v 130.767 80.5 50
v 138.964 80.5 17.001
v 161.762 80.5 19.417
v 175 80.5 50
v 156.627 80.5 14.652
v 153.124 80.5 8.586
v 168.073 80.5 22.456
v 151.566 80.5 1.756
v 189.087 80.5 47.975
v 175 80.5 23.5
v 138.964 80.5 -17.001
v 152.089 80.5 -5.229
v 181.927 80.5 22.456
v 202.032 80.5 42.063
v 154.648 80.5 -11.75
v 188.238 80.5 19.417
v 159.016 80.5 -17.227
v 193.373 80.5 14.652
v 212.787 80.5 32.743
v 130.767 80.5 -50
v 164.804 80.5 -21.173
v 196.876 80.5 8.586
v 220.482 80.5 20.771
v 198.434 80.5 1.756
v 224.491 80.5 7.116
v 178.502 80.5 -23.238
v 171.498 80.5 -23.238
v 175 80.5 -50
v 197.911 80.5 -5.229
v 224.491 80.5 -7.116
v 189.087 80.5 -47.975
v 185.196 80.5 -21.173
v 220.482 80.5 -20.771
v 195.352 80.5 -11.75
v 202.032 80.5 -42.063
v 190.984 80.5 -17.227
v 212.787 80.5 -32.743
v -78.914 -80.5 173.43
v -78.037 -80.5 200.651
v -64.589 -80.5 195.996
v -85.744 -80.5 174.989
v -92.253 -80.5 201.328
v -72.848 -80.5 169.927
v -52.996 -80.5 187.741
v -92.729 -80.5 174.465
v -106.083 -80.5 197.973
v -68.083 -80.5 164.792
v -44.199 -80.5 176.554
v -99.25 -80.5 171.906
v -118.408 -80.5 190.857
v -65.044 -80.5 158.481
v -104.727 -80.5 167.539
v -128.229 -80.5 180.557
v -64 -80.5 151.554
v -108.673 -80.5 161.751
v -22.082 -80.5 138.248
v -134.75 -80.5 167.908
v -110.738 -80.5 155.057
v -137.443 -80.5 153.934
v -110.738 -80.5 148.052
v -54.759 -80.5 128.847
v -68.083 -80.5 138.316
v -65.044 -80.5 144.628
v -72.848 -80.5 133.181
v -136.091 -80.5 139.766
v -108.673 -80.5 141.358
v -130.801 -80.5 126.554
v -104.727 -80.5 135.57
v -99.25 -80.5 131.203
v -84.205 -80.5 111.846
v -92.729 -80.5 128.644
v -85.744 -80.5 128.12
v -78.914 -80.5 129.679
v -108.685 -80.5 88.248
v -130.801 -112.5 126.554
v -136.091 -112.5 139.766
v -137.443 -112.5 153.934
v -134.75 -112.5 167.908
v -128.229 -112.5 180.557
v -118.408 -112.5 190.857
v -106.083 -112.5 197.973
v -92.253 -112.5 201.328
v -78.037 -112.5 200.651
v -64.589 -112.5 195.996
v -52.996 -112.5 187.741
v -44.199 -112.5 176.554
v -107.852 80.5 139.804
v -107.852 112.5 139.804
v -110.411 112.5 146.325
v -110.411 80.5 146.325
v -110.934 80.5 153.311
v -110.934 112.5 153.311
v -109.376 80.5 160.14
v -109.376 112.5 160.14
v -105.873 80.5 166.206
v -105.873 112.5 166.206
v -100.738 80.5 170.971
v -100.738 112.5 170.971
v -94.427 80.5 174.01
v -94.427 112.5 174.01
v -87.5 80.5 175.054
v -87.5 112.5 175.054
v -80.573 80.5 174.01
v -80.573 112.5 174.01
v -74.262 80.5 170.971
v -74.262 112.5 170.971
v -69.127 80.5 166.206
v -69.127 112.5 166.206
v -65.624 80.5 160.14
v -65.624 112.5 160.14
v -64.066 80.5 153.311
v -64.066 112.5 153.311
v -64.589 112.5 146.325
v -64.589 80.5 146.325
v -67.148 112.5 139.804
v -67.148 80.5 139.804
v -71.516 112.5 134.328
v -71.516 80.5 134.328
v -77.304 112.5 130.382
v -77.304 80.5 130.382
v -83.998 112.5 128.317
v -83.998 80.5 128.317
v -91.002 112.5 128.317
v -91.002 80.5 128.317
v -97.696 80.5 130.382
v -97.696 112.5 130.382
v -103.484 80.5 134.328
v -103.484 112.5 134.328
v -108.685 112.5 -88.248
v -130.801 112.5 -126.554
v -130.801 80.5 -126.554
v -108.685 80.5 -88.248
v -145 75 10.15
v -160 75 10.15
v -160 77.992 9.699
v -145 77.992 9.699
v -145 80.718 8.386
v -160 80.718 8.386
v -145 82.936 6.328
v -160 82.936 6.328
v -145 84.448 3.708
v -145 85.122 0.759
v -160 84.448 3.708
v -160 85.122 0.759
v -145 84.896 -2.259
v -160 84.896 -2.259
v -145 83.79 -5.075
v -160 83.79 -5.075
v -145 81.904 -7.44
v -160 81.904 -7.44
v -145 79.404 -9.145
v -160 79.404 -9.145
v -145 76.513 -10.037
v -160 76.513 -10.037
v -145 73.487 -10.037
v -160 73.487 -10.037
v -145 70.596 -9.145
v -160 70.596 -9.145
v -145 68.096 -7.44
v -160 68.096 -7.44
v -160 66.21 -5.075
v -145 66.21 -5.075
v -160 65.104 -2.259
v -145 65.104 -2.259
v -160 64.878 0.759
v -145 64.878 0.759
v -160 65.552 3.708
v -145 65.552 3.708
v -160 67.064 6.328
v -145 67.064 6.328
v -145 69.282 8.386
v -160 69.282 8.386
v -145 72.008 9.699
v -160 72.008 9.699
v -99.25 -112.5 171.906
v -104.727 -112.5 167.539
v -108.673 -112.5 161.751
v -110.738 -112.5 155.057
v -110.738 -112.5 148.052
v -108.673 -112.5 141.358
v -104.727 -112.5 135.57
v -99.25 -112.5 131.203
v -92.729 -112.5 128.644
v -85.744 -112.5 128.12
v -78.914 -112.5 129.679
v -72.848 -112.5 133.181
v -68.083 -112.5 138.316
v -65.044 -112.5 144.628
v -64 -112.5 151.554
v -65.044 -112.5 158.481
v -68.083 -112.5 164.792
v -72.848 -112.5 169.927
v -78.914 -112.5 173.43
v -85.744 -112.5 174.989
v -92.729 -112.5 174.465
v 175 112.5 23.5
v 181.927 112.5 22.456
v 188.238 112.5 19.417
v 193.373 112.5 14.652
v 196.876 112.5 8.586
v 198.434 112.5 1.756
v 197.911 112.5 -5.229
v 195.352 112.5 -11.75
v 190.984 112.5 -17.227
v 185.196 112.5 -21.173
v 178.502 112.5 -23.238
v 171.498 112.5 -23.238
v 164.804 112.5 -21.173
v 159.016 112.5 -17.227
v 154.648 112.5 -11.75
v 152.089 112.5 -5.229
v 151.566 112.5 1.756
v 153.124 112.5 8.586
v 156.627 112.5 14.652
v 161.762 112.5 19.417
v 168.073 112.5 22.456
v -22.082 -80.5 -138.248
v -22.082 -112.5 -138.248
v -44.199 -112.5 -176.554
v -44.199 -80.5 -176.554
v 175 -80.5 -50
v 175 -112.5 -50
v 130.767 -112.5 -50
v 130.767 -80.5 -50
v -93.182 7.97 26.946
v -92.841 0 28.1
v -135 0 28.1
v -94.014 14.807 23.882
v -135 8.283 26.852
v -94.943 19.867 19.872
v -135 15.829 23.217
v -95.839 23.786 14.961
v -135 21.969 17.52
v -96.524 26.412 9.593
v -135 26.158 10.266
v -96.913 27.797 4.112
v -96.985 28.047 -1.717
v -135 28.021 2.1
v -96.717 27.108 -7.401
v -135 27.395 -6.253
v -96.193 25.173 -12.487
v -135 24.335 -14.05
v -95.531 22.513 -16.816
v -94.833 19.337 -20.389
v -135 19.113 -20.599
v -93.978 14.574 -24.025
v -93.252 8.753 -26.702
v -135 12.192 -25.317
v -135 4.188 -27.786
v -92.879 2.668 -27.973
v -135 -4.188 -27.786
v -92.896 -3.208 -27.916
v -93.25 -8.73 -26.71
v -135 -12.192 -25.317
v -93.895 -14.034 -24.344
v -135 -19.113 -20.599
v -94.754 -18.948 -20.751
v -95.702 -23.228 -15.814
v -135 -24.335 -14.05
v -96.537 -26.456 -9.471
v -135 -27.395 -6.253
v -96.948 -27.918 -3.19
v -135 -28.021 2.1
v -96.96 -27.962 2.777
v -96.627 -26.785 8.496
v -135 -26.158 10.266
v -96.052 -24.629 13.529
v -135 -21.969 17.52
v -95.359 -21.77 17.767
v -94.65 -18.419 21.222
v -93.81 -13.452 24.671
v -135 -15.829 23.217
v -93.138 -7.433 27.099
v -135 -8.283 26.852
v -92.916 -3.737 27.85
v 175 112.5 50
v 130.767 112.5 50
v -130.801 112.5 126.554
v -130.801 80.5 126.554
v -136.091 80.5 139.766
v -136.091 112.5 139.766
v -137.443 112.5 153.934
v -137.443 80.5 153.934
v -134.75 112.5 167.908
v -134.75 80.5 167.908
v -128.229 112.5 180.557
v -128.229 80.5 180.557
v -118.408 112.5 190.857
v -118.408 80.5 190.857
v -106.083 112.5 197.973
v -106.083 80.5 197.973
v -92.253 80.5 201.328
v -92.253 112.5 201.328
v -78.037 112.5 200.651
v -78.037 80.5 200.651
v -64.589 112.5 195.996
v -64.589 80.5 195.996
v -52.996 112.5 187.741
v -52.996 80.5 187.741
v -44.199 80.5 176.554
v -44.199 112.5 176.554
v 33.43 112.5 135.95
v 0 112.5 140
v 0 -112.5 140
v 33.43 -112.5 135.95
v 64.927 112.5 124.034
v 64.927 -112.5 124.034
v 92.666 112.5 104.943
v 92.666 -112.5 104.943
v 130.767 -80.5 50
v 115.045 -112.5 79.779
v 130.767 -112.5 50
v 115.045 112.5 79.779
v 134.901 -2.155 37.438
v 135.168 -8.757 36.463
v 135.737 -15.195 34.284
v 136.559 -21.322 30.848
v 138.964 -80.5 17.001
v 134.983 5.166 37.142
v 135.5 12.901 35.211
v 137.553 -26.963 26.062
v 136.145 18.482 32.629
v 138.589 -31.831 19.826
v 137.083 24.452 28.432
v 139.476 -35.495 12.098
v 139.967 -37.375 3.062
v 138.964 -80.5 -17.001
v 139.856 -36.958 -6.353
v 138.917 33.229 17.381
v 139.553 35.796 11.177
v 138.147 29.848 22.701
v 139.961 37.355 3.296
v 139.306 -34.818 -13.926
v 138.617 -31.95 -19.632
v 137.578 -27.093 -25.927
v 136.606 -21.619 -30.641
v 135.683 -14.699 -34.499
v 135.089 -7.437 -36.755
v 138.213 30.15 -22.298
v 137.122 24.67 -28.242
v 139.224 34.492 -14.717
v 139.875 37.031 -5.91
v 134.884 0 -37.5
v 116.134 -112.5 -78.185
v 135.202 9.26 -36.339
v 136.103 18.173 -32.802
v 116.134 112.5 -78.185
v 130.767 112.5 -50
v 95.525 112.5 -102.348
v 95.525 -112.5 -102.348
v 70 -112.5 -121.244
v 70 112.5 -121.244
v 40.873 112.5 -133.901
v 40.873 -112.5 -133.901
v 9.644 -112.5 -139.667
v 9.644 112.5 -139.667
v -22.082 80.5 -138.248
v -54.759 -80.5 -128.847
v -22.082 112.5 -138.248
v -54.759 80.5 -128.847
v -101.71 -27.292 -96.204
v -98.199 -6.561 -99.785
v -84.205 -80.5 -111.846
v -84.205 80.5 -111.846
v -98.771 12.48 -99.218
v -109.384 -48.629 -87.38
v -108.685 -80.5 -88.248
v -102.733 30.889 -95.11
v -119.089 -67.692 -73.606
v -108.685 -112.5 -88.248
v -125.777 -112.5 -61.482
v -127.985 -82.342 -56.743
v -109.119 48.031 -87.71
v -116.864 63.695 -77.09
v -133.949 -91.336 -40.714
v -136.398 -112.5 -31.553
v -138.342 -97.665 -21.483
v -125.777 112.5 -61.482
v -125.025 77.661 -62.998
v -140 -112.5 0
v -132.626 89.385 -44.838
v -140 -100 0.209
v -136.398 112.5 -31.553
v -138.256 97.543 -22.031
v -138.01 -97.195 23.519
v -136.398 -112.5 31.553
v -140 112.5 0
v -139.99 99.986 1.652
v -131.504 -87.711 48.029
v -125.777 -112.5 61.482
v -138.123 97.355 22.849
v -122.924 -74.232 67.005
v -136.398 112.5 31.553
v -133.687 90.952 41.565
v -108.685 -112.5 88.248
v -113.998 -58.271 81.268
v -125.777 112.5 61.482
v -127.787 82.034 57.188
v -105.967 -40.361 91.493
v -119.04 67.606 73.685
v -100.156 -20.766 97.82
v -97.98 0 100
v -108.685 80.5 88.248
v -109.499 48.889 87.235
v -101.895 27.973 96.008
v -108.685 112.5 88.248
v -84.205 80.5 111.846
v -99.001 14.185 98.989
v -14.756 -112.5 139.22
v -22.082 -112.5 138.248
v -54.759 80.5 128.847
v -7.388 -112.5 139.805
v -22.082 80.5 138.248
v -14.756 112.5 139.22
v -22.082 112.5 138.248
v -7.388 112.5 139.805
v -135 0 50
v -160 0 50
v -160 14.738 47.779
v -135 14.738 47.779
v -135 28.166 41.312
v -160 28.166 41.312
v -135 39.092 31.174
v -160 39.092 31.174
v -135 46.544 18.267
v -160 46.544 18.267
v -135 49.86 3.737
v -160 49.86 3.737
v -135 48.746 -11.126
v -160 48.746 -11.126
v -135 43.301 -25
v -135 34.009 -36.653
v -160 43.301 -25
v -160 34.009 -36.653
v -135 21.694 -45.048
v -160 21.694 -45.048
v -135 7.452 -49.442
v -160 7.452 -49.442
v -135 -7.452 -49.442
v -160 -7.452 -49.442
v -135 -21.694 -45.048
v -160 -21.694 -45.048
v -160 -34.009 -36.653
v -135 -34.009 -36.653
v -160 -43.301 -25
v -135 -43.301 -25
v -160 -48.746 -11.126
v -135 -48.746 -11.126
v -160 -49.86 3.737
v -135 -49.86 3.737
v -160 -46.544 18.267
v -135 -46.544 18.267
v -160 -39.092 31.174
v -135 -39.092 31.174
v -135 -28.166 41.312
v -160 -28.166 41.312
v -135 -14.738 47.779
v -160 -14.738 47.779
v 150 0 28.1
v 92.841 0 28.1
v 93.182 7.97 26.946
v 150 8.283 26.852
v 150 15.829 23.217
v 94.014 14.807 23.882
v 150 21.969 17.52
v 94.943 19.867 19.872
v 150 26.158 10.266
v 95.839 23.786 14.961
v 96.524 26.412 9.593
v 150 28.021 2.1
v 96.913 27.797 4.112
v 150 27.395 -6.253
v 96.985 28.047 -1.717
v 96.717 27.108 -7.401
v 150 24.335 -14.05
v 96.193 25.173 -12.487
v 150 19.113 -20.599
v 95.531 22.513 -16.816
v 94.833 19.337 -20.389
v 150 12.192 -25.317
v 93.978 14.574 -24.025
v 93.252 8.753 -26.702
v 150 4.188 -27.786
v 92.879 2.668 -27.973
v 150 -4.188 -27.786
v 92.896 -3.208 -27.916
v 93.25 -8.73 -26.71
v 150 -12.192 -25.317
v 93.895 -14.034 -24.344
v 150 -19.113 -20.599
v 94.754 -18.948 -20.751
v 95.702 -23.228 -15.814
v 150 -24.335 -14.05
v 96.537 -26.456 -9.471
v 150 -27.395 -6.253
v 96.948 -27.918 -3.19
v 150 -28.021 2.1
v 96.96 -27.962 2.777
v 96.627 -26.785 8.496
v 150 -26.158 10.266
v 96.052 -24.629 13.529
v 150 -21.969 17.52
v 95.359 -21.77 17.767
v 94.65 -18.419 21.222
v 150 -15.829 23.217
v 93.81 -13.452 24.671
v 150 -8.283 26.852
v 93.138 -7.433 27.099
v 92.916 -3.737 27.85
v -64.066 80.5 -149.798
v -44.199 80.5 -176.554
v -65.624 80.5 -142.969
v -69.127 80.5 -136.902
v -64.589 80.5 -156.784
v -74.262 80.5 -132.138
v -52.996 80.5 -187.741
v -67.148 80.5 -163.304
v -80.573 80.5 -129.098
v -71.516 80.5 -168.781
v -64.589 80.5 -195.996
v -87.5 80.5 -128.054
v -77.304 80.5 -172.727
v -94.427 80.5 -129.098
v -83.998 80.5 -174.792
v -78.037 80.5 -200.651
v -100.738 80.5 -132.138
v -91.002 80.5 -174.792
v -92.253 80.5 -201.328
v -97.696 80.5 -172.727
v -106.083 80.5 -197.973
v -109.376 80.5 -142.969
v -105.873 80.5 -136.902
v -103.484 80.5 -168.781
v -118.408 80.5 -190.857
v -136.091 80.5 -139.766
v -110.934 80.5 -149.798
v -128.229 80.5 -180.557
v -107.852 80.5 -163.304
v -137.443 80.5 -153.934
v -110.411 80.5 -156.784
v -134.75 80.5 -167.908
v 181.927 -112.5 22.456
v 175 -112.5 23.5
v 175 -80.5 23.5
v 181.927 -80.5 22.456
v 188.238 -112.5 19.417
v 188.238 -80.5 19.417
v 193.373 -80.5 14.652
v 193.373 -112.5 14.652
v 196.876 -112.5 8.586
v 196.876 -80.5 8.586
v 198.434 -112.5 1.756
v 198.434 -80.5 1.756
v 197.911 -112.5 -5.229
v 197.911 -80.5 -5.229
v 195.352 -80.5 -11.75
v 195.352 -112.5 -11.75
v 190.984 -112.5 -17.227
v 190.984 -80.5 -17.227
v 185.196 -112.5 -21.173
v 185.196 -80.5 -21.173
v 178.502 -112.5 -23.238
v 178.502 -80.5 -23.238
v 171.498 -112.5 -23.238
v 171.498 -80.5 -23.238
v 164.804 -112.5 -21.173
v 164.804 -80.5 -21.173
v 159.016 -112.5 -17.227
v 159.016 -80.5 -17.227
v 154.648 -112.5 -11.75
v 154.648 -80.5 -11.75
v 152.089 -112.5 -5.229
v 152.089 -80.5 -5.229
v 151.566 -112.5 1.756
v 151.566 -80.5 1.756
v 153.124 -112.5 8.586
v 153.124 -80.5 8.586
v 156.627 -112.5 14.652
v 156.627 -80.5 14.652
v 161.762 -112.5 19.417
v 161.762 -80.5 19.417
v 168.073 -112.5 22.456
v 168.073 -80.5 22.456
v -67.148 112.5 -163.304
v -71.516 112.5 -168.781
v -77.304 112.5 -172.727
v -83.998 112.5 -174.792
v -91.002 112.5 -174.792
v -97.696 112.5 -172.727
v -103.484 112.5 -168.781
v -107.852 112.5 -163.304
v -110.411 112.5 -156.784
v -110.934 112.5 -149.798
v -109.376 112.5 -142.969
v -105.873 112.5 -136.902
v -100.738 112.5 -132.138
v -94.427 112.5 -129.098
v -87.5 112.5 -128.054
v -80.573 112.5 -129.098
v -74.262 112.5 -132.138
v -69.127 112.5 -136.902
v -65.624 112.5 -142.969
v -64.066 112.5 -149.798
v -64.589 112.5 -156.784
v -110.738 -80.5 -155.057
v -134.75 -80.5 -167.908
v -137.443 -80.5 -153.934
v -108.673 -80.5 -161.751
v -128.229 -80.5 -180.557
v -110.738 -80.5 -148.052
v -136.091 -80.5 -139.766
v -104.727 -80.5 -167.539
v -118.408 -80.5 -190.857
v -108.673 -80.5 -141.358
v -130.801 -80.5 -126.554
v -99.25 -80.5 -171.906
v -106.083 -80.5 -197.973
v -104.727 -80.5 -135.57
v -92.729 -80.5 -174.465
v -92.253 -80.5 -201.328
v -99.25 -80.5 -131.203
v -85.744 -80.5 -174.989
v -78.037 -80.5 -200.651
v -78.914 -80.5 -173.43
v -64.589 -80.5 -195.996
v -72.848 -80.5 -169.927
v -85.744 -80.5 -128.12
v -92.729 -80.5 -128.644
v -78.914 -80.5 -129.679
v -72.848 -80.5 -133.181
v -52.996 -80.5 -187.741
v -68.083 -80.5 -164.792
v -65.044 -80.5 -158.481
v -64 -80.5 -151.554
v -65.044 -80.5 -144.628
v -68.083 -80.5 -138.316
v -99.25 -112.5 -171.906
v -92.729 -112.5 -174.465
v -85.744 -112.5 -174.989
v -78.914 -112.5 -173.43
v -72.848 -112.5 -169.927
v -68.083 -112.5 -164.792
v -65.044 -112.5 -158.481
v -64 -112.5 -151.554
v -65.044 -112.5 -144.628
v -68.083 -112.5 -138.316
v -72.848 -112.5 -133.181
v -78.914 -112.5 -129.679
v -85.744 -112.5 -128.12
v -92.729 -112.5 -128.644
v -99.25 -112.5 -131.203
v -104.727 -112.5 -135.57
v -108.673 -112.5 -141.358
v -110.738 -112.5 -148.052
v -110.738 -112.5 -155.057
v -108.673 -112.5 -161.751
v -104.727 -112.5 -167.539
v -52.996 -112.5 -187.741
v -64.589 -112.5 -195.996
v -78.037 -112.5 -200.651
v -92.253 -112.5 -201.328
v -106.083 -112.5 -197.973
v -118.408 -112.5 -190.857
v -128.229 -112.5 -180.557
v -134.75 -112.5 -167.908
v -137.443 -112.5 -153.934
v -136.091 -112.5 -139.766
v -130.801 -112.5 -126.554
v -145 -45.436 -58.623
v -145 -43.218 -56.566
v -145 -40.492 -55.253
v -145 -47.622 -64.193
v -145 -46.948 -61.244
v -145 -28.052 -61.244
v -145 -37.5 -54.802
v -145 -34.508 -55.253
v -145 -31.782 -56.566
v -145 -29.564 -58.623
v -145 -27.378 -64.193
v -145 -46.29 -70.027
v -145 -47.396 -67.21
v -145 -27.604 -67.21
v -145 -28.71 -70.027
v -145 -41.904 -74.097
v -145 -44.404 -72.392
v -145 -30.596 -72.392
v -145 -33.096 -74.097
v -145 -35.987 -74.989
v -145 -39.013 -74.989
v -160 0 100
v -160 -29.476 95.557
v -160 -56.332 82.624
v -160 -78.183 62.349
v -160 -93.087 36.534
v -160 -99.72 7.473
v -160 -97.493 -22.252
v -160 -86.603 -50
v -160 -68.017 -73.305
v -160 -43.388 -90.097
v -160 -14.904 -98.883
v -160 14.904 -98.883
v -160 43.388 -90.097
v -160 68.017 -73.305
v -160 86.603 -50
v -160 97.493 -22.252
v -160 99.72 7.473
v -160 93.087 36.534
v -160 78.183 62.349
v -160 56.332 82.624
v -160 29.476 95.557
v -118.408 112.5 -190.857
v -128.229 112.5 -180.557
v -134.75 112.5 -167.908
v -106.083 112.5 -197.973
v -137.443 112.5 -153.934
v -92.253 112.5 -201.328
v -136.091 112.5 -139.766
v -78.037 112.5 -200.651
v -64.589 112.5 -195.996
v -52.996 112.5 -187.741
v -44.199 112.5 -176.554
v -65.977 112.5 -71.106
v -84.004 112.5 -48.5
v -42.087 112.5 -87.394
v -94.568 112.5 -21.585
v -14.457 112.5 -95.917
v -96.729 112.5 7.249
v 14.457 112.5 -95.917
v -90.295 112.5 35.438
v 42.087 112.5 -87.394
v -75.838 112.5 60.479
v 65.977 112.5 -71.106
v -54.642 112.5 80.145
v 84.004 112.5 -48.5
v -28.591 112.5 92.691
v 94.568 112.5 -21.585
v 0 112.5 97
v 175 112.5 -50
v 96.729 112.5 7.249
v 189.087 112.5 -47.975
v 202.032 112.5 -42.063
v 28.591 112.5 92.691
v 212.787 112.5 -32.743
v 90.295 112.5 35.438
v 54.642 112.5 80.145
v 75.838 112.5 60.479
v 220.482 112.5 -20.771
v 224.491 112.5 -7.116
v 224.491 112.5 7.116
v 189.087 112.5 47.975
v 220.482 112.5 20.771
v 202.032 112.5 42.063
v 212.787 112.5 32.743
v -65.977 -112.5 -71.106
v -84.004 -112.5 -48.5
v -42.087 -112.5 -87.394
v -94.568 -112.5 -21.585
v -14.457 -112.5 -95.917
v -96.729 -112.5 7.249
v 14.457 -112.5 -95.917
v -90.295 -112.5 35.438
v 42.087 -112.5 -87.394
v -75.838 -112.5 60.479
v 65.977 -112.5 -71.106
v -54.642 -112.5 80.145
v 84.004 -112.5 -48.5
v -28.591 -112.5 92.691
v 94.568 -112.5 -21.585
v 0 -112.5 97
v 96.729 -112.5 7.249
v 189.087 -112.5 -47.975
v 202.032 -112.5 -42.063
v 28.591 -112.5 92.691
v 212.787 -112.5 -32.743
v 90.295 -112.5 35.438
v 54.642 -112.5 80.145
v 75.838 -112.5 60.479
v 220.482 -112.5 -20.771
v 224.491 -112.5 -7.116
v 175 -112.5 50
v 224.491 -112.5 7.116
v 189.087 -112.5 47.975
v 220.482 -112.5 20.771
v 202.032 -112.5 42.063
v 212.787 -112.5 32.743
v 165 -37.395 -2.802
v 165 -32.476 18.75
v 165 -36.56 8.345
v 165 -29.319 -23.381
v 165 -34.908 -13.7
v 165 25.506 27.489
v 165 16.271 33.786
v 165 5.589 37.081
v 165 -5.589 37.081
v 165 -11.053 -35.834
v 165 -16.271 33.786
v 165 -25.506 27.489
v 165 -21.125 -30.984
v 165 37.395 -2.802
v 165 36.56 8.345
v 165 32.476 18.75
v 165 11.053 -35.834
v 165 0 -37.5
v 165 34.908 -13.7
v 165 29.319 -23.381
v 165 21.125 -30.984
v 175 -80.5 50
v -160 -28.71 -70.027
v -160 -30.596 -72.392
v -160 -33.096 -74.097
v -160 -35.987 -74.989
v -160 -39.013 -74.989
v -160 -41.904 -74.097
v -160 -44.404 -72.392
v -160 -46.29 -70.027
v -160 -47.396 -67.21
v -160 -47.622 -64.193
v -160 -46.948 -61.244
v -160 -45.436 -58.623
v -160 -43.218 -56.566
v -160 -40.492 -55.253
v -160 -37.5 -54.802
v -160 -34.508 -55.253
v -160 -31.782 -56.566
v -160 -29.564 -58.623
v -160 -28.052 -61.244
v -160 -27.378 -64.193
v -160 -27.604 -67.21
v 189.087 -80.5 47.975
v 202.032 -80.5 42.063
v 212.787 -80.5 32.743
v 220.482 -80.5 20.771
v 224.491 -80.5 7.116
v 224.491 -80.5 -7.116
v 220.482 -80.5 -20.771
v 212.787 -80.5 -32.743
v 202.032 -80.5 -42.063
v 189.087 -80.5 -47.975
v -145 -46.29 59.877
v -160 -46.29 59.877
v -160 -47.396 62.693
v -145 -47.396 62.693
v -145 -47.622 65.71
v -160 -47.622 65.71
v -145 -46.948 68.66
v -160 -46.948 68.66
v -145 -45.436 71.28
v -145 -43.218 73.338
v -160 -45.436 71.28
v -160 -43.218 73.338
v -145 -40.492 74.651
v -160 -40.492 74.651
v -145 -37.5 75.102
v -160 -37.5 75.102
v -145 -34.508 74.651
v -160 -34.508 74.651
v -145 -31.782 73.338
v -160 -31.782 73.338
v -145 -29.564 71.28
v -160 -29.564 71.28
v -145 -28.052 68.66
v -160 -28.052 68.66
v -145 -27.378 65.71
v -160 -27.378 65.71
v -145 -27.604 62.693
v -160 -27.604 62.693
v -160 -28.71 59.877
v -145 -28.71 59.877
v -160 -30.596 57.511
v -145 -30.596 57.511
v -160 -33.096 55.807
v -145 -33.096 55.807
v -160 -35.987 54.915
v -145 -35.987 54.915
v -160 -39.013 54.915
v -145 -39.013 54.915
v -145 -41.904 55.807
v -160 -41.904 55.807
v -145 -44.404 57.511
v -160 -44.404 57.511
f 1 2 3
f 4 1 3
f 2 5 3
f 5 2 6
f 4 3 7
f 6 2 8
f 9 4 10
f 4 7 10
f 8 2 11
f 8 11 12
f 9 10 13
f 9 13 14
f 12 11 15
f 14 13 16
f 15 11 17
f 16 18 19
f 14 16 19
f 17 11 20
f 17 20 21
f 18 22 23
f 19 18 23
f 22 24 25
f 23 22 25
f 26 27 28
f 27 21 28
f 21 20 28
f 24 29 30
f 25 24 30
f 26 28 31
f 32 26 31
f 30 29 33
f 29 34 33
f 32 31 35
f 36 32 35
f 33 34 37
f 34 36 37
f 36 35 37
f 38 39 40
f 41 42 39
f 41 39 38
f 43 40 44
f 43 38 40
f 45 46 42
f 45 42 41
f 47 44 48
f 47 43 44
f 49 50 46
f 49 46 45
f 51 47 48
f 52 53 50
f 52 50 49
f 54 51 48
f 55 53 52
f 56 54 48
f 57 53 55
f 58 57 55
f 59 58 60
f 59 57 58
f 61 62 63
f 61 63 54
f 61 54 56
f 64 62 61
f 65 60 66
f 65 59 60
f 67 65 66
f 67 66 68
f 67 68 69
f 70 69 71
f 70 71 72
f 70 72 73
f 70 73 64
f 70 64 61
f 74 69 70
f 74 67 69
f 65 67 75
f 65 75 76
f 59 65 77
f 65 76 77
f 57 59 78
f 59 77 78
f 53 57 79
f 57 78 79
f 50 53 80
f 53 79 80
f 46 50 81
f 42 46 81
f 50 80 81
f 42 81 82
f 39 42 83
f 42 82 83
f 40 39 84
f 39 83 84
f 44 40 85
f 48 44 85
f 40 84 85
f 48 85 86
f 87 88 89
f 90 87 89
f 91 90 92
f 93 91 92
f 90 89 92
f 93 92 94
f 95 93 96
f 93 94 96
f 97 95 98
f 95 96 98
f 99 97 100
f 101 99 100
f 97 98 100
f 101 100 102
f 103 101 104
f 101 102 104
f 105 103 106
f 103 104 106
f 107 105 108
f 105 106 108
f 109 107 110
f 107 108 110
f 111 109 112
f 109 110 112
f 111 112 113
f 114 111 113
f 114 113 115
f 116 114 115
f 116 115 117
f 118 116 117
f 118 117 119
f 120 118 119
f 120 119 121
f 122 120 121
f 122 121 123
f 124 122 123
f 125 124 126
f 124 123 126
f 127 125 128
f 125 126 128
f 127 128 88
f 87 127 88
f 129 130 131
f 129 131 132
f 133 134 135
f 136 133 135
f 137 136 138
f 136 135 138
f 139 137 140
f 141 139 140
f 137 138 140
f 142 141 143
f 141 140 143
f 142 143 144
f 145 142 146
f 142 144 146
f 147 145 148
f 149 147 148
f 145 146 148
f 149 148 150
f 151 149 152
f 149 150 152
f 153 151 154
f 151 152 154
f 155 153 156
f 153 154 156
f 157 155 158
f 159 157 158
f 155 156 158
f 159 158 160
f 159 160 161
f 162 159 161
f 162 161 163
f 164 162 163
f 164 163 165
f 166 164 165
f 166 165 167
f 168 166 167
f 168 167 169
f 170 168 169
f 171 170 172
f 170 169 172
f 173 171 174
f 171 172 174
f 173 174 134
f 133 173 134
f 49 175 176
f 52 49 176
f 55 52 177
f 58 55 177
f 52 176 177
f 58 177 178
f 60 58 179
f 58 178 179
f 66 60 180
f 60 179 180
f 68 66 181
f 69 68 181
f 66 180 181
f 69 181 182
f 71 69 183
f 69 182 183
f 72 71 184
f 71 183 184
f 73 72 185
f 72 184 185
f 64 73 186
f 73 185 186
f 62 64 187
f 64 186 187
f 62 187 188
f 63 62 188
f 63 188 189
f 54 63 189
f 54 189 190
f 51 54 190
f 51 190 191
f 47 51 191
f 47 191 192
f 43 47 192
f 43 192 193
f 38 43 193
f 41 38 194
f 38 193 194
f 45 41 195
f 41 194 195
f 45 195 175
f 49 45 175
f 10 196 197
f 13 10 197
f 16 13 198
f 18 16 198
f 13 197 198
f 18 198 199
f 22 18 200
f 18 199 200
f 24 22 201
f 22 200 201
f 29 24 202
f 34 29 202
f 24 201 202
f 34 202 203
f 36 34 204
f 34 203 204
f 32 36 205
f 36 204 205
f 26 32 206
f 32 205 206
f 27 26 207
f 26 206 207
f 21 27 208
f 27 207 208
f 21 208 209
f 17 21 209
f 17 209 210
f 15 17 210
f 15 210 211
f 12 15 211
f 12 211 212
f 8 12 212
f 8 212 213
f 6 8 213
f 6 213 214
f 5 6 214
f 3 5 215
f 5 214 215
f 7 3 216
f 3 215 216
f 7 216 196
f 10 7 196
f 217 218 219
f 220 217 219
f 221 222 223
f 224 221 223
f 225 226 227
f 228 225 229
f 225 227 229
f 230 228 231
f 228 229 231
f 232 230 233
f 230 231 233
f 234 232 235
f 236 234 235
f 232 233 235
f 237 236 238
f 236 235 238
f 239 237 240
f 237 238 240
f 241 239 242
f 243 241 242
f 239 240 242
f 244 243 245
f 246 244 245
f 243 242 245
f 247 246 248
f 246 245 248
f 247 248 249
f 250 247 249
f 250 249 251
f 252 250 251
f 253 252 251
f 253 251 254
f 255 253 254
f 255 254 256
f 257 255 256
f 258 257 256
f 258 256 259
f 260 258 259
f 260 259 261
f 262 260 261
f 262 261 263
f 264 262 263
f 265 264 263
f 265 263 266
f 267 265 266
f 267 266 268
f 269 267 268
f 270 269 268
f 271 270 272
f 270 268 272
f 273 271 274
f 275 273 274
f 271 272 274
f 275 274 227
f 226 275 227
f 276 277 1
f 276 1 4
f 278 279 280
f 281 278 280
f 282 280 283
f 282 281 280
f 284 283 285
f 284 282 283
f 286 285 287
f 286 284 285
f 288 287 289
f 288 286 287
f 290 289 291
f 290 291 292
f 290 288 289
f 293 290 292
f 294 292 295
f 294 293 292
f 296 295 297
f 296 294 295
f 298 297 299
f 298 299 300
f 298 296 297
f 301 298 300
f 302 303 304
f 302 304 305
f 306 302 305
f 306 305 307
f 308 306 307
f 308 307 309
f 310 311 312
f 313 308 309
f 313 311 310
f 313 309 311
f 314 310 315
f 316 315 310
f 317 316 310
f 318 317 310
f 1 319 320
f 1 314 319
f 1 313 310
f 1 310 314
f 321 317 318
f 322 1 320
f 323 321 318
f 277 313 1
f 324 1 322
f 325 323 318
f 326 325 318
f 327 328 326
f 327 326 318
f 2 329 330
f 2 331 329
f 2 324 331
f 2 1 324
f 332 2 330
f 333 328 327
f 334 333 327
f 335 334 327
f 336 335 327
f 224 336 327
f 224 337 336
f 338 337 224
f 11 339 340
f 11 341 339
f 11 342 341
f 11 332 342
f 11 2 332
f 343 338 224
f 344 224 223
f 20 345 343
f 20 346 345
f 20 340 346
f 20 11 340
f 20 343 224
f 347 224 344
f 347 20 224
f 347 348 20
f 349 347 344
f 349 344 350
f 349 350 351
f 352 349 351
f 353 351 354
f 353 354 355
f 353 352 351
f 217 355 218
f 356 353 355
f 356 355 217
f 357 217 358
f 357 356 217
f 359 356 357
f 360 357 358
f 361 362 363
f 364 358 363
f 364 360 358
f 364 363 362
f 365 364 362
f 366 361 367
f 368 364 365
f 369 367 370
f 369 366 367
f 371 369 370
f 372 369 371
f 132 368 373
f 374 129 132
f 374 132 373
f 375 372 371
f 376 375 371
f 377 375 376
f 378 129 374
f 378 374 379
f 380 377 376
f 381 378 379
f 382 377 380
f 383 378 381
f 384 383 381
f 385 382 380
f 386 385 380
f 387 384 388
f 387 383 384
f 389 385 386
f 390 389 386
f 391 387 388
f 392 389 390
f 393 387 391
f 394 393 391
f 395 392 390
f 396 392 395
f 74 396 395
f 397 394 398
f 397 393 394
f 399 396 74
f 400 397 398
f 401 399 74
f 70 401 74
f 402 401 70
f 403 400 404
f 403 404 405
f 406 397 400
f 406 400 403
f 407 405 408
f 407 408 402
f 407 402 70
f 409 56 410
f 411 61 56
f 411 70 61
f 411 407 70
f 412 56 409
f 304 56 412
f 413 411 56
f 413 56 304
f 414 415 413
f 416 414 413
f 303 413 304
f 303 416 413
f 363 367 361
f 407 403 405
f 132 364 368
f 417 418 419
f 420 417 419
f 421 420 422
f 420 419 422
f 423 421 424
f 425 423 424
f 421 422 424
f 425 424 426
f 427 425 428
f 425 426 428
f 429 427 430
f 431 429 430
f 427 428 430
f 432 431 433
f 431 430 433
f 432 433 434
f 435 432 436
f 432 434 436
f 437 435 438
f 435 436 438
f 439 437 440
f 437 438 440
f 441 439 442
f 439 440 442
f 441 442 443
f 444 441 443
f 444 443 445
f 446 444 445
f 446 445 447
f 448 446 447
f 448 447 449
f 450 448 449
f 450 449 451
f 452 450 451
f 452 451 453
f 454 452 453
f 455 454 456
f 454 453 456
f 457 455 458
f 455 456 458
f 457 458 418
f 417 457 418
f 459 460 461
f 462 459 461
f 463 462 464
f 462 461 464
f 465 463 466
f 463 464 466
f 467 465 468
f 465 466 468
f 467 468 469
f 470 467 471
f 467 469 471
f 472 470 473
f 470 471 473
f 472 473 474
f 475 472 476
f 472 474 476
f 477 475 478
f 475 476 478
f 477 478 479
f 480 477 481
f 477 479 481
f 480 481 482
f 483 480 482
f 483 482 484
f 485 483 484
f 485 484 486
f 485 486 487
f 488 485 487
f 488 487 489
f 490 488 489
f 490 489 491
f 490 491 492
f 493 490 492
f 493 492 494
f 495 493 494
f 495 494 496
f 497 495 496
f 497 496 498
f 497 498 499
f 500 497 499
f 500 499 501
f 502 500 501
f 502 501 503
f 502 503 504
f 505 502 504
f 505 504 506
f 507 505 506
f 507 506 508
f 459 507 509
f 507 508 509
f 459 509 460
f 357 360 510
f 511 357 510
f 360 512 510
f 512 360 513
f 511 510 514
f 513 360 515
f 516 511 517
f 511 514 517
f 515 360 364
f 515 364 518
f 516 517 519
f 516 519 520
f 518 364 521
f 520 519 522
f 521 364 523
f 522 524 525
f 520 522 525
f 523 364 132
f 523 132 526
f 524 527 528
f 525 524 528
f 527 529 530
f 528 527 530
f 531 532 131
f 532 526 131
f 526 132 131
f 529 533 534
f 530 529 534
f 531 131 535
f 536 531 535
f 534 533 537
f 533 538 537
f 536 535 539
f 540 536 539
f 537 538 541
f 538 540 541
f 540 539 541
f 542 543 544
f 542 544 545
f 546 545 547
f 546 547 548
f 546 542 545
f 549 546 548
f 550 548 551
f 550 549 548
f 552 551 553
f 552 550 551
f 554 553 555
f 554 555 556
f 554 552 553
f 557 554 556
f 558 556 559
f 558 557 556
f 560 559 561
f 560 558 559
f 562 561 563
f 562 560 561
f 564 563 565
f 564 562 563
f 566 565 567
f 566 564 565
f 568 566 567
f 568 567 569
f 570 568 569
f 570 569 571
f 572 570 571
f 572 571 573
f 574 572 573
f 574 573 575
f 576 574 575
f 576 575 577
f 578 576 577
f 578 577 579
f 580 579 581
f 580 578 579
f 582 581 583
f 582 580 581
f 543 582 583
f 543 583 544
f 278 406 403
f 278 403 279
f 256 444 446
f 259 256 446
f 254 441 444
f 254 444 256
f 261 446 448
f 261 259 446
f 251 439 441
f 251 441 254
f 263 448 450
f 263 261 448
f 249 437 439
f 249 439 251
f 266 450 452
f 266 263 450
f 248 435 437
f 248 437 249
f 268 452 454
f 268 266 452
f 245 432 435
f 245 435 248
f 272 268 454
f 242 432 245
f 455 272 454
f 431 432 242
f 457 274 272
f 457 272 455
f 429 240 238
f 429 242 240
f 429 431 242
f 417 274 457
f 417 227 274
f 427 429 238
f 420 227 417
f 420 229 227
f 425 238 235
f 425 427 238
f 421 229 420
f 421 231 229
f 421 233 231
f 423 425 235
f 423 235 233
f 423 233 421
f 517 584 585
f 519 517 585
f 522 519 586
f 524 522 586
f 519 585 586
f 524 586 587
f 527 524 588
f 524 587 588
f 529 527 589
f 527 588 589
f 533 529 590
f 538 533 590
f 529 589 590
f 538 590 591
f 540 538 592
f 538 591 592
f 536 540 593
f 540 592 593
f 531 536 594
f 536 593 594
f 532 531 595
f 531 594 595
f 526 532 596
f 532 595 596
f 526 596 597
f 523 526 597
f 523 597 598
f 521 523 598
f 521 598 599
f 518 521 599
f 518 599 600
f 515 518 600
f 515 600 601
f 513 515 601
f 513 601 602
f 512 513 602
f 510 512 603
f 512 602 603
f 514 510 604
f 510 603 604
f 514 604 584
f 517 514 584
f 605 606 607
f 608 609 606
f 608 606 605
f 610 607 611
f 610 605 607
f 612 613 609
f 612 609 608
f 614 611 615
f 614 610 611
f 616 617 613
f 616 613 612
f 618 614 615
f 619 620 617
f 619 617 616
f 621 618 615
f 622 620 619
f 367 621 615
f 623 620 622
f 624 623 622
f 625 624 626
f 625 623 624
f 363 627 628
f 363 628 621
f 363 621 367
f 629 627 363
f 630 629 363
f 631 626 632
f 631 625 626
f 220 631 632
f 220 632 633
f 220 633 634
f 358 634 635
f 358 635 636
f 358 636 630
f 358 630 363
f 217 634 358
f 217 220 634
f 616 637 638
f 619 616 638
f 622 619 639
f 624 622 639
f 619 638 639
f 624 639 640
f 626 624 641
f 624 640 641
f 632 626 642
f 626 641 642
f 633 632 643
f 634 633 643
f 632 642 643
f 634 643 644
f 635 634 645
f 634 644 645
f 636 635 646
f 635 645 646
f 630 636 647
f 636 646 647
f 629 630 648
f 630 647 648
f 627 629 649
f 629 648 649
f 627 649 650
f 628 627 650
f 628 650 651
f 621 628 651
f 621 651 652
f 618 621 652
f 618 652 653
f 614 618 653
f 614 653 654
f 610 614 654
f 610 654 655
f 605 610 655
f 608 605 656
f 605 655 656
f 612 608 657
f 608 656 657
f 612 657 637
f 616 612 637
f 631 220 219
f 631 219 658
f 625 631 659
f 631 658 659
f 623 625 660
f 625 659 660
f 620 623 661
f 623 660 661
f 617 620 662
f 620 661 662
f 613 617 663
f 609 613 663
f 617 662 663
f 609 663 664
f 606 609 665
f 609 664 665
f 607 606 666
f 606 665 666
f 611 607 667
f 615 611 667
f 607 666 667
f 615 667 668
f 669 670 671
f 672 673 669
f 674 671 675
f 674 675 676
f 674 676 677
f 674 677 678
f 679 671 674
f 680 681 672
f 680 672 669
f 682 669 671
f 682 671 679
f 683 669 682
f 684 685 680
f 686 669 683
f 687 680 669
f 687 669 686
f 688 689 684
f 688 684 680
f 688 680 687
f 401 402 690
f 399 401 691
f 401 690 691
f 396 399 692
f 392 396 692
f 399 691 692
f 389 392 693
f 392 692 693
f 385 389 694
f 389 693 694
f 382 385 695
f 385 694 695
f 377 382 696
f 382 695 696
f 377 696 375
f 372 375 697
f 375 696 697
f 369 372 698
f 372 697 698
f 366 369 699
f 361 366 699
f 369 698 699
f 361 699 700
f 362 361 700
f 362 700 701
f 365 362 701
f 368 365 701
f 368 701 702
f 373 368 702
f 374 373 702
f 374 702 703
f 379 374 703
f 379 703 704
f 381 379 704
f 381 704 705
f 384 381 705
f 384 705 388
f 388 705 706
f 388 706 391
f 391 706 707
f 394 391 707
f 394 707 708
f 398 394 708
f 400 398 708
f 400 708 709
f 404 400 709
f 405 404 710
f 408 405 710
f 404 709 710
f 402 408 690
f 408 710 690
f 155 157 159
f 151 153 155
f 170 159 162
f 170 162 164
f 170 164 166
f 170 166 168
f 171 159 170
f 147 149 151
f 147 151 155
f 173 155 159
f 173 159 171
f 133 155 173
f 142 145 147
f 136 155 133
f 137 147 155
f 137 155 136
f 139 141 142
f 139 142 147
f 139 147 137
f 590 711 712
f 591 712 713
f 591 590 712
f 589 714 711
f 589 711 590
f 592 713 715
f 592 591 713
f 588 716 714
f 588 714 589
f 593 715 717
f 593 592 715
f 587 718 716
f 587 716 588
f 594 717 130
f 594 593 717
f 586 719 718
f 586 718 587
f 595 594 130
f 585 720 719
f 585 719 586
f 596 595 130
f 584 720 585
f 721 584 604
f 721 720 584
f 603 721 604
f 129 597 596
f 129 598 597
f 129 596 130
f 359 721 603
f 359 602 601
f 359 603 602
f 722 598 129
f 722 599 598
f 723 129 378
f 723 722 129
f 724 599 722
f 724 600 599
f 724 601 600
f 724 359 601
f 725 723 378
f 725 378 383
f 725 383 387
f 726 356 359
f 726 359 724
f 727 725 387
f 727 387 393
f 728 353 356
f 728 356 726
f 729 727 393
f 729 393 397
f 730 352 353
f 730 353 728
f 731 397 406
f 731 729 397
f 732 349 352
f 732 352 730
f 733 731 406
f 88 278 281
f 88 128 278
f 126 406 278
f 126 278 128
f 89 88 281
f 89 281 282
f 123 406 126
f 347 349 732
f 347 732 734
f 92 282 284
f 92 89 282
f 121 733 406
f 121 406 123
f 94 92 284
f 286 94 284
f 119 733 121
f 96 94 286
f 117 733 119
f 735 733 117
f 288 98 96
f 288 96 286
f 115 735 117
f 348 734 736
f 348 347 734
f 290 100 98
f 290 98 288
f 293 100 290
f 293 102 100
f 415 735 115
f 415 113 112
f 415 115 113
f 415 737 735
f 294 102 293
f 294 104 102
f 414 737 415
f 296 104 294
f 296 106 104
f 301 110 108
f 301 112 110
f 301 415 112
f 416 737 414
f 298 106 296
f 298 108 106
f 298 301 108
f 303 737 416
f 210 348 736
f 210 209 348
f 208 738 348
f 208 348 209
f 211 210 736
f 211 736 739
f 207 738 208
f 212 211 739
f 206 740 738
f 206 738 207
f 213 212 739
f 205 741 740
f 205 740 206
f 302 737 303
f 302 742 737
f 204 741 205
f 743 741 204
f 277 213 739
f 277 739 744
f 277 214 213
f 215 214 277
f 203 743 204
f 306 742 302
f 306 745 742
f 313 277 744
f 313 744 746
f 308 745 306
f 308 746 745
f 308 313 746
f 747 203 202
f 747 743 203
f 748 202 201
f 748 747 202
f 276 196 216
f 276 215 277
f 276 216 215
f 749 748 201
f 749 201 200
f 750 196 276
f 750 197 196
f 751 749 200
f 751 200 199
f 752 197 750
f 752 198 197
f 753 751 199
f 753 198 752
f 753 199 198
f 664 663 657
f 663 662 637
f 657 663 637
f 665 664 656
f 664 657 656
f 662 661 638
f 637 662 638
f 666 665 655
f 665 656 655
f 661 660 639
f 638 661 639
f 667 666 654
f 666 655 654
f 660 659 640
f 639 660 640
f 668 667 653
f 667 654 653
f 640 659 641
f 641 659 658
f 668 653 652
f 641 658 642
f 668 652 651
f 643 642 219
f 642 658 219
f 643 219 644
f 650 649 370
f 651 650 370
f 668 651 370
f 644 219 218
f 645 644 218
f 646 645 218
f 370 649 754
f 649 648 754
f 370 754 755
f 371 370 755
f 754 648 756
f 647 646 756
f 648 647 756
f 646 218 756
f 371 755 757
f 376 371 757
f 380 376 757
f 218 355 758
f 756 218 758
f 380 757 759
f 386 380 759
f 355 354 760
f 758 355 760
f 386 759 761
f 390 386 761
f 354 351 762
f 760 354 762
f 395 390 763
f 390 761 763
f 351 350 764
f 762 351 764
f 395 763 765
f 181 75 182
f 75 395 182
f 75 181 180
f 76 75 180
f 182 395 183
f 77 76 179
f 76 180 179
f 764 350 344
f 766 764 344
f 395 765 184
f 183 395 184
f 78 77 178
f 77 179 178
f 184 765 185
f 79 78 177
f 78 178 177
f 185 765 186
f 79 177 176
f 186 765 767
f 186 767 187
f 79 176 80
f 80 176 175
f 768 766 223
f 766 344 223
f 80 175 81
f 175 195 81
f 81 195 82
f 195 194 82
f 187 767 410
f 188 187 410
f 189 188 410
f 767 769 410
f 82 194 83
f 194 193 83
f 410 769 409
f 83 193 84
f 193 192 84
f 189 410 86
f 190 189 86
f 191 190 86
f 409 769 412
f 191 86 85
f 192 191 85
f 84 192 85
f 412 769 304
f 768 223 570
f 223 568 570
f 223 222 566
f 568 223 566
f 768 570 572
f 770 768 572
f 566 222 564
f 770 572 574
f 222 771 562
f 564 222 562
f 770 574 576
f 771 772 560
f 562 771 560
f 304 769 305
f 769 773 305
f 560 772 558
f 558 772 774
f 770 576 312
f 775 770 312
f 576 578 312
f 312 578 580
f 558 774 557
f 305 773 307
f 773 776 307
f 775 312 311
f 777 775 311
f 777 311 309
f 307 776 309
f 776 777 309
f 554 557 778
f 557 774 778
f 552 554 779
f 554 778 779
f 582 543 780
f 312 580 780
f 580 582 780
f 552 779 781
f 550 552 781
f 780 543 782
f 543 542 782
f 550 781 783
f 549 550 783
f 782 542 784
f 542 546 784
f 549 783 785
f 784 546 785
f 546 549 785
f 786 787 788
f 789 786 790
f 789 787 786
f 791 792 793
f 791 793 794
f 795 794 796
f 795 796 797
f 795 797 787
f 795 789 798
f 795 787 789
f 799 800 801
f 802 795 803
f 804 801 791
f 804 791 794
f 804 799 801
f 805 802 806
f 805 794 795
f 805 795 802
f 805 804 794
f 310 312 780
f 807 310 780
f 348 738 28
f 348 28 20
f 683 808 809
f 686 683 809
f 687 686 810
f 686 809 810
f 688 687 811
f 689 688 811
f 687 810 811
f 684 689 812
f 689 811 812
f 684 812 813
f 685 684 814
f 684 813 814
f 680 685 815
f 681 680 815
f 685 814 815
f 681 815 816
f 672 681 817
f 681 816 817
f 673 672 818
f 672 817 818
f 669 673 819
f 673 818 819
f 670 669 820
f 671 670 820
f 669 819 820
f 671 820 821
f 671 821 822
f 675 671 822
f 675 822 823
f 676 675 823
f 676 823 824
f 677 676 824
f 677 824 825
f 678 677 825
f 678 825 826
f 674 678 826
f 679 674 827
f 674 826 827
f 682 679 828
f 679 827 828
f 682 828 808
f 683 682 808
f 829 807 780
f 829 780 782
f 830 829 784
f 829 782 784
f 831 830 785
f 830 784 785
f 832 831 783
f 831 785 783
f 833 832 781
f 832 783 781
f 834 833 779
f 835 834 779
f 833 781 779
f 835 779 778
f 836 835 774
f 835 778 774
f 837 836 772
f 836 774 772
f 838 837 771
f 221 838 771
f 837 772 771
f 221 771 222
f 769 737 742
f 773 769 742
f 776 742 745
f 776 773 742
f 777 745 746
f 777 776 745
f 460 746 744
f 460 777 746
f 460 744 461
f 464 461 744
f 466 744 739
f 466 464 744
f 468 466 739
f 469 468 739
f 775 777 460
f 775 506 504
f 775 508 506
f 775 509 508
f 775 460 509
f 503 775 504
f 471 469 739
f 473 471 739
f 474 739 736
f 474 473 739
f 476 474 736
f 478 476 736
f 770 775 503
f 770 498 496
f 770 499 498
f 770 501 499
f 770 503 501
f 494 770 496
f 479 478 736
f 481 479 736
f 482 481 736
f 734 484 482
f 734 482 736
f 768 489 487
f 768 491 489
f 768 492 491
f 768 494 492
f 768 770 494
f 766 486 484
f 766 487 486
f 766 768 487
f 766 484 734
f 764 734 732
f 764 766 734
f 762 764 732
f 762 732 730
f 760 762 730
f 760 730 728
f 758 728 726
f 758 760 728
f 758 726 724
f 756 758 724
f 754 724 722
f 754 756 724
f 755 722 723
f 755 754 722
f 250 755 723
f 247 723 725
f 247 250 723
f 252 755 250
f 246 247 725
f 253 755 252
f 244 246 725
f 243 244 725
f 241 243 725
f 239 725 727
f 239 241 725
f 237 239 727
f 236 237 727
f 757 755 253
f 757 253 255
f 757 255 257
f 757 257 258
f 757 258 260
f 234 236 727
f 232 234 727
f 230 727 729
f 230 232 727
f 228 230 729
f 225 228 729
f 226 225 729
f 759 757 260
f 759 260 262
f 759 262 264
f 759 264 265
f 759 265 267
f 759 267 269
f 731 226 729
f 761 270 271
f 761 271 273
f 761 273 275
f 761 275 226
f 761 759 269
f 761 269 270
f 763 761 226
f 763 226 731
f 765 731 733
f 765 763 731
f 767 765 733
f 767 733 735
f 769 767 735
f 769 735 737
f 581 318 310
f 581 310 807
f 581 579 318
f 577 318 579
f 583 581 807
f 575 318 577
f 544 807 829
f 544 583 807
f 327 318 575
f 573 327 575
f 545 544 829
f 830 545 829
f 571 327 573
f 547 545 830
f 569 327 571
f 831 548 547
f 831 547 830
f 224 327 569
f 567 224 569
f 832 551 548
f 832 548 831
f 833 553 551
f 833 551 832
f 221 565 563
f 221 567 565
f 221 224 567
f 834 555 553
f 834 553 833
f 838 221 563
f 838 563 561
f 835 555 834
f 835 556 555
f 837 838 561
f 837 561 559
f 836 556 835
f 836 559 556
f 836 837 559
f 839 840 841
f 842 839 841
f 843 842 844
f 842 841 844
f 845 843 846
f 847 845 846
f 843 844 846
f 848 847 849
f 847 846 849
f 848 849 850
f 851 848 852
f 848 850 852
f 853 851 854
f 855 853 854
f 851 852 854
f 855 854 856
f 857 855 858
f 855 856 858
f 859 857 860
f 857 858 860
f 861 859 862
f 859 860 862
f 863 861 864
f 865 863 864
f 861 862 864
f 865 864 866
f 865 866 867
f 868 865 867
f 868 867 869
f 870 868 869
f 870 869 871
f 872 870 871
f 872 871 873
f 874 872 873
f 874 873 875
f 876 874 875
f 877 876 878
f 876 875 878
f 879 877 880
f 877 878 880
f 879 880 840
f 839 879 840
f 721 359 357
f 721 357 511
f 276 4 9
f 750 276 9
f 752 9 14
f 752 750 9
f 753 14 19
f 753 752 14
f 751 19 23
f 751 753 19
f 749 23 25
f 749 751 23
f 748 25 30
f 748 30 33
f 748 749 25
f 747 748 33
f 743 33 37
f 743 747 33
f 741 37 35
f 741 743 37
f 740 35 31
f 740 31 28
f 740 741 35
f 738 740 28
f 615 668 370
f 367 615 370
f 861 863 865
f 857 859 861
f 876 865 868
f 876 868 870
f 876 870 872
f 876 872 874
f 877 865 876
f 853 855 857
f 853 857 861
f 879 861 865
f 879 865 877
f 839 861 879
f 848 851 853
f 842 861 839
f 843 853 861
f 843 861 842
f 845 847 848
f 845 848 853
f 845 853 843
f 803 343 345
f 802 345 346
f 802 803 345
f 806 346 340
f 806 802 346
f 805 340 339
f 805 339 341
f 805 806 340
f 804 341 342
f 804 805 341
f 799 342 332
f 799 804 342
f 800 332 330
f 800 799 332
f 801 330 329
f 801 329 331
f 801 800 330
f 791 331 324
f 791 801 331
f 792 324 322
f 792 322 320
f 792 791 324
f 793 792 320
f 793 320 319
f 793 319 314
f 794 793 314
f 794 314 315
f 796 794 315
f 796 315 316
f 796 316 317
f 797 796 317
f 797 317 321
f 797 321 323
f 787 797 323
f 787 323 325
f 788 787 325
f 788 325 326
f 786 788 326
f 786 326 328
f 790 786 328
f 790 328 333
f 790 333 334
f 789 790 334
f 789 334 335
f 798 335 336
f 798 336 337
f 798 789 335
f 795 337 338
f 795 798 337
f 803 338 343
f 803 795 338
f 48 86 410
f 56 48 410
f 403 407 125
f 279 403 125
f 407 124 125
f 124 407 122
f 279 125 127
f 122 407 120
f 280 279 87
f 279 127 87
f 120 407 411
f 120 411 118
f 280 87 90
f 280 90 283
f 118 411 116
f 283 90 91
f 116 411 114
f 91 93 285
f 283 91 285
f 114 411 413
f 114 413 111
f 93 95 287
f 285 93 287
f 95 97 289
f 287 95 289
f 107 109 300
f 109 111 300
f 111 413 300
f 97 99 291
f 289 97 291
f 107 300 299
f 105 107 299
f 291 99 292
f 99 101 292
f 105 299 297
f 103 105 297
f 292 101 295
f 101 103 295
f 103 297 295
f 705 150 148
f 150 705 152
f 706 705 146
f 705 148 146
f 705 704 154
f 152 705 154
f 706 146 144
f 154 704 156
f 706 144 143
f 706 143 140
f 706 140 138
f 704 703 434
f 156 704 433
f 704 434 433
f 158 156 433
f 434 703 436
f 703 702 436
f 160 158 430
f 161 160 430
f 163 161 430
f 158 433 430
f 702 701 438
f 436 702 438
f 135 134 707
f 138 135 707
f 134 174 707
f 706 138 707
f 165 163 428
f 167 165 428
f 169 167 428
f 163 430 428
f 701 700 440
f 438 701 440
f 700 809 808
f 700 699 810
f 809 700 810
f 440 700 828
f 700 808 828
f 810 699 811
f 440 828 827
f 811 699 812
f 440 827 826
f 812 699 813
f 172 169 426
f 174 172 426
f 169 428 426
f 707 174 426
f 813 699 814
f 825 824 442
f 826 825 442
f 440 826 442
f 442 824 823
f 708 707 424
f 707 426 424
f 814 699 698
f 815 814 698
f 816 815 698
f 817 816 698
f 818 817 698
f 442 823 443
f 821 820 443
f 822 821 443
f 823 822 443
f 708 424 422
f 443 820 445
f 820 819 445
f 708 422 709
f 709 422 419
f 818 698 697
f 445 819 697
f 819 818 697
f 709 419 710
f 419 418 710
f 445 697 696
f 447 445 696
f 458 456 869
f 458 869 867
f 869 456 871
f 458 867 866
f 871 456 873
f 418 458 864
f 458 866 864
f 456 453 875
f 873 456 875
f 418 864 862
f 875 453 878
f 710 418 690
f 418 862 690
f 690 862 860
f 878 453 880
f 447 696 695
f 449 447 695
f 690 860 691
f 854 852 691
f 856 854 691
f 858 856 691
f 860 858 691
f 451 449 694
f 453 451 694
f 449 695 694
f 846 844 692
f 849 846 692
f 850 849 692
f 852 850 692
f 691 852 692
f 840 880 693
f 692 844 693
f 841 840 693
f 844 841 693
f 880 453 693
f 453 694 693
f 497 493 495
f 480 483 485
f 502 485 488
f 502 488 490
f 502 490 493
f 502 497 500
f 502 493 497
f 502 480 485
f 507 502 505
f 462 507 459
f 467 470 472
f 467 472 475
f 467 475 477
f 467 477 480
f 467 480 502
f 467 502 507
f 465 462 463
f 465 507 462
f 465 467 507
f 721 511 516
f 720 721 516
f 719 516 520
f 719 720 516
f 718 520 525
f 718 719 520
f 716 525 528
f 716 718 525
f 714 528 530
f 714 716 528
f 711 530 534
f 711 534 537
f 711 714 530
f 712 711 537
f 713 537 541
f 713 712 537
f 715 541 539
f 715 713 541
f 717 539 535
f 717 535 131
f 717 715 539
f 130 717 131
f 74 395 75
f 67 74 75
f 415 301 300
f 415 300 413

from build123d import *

# Parameters (mm, degrees)
SKETCH1_R                = 140
SKETCH1_R_2              = 97
BOSS_EXTRUDE1_DEPTH      = 112.5
SKETCH2_R                = 23.5
BOSS_EXTRUDE2_DEPTH      = 32
CIRPATTERN1_COUNT        = 3
MIRROR1_COPY_1_SKETCH_R  = 23.5
MIRROR1_COPY_1_DEPTH     = 32
MIRROR1_COPY_2_SKETCH_R  = 23.5
MIRROR1_COPY_2_DEPTH     = 32
BOSS_EXTRUDE3_REACH      = 450.894
BOSS_EXTRUDE3_END_RADIUS = 140
SKETCH7_R                = 100
SKETCH8_R                = 50
CUT_EXTRUDE1_DEPTH       = 25
BOSS_EXTRUDE4_REACH      = 400.629
BOSS_EXTRUDE4_END_RADIUS = 140
SKETCH10_R               = 37.5
SKETCH9_R                = 28.1
CUT_EXTRUDE2_DEPTH       = 285
SKETCH11_R               = 10.15
CUT_EXTRUDE3_DEPTH       = 15
CIRPATTERN2_COUNT        = 3


with BuildPart() as part:
    # Sketch1 → Boss-Extrude1 (new, symmetric)
    with BuildSketch(Plane(origin=(0, 0, 0), x_dir=(1, 0, 0), z_dir=(0, 1, 0))):
        with Locations(Location((0, 0, 0), (0, 0, 270))):
            Circle(SKETCH1_R)
        with Locations(Location((0, 0, 0), (0, 0, 270))):
            Circle(SKETCH1_R_2, mode=Mode.SUBTRACT)
    extrude(amount=BOSS_EXTRUDE1_DEPTH, both=True)

    # Sketch2 → Boss-Extrude2 (add)
    with BuildSketch(Plane(origin=(0, 112.5, 0), x_dir=(1, 0, 0), z_dir=(0, 1, 0))):
        with BuildLine():
            Line((175, 50), (130.766968306, 50))
            ThreePointArc((130.766968306, 50), (140, 0), (130.766968306, -50))
            Line((130.766968306, -50), (175, -50))
            ThreePointArc((175, -50), (225, 0), (175, 50))
        make_face()
        with Locations(Location((175, 0, 0), (0, 0, 270))):
            Circle(SKETCH2_R, mode=Mode.SUBTRACT)
    boss_extrude2 = extrude(amount=-BOSS_EXTRUDE2_DEPTH)

    # CirPattern1: Boss-Extrude2 ×3 about axis
    cirpattern1_axis = Axis((0, 0, 0), (0, 1, 0))
    for i in range(1, CIRPATTERN1_COUNT):
        add(boss_extrude2.rotate(cirpattern1_axis, i * 360 / CIRPATTERN1_COUNT))

    # Mirror1: Boss-Extrude2 across plane
    add(boss_extrude2.mirror(Plane.ZX))

    # Mirror1 copy 1 sketch → Mirror1 copy 1 (add)
    with BuildSketch(Plane(origin=(0, -112.5, 0), x_dir=(-0.4999999999999998, 0, -0.8660254037844387), z_dir=(0, -1, 0))):
        with BuildLine():
            Line((175, -50), (130.766968306, -50))
            ThreePointArc((130.766968306, -50), (140, 0), (130.766968306, 50))
            Line((130.766968306, 50), (175, 50))
            ThreePointArc((175, 50), (225, 0), (175, -50))
        make_face()
        with Locations((175, 0)):
            Circle(MIRROR1_COPY_1_SKETCH_R, mode=Mode.SUBTRACT)
    extrude(amount=-MIRROR1_COPY_1_DEPTH)

    # Mirror1 copy 2 sketch → Mirror1 copy 2 (add)
    with BuildSketch(Plane(origin=(0, -112.5, 0), x_dir=(-0.5000000000000004, 0, 0.8660254037844384), z_dir=(0, -1, 0))):
        with BuildLine():
            Line((175, -50), (130.766968306, -50))
            ThreePointArc((130.766968306, -50), (140, 0), (130.766968306, 50))
            Line((130.766968306, 50), (175, 50))
            ThreePointArc((175, 50), (225, 0), (175, -50))
        make_face()
        with Locations((175, 0)):
            Circle(MIRROR1_COPY_2_SKETCH_R, mode=Mode.SUBTRACT)
    extrude(amount=-MIRROR1_COPY_2_DEPTH)

    # Boss-Extrude3: up to this cylinder (the profile starts outside it)
    boss_extrude3_end = Plane(origin=(0, 0, 0), z_dir=(0, -1, 0)) * Cylinder(BOSS_EXTRUDE3_END_RADIUS, 1182.788, mode=Mode.PRIVATE)
    # Sketch7 → Boss-Extrude3 (add, up to the surface)
    with BuildSketch(Plane(origin=(-160, 0, 0), x_dir=(0, 0, -1), z_dir=(1, 0, 0)), mode=Mode.PRIVATE) as boss_extrude3_sk1:
        with Locations(Location((0, 0, 0), (0, 0, 180))):
            Circle(SKETCH7_R)
    boss_extrude3_tool1 = extrude(boss_extrude3_sk1.sketch, amount=BOSS_EXTRUDE3_REACH, mode=Mode.PRIVATE) - boss_extrude3_end
    add(boss_extrude3_tool1.solids().sort_by_distance((-160, 0, 0))[0])

    # Sketch8 → Cut-Extrude1 (cut)
    with BuildSketch(Plane.ZY.offset(160)):
        Circle(SKETCH8_R)
    extrude(amount=-CUT_EXTRUDE1_DEPTH, mode=Mode.SUBTRACT)

    # Boss-Extrude4: up to this cylinder (the profile starts outside it)
    boss_extrude4_end = Plane(origin=(0, 0, 0), z_dir=(0, -1, 0)) * Cylinder(BOSS_EXTRUDE4_END_RADIUS, 1082.258, mode=Mode.PRIVATE)
    # Sketch10 → Boss-Extrude4 (add, up to the surface)
    with BuildSketch(Plane(origin=(165, 0, 0), x_dir=(0, 0, -1), z_dir=(1, 0, 0)), mode=Mode.PRIVATE) as boss_extrude4_sk1:
        Circle(SKETCH10_R)
    boss_extrude4_tool1 = extrude(boss_extrude4_sk1.sketch, amount=-BOSS_EXTRUDE4_REACH, mode=Mode.PRIVATE) - boss_extrude4_end
    add(boss_extrude4_tool1.solids().sort_by_distance((165, 0, 0))[0])

    # Sketch9 → Cut-Extrude2 (cut)
    with BuildSketch(Plane.ZY.offset(135)):
        Circle(SKETCH9_R)
    extrude(amount=-CUT_EXTRUDE2_DEPTH, mode=Mode.SUBTRACT)

    # Sketch11 → Cut-Extrude3 (cut)
    with BuildSketch(Plane.ZY.offset(160)):
        with Locations((0, 75)):
            Circle(SKETCH11_R)
    cut_extrude3 = extrude(amount=-CUT_EXTRUDE3_DEPTH, mode=Mode.SUBTRACT)

    # CirPattern2: Cut-Extrude3 ×3 about axis
    cirpattern2_axis = Axis((0, 0, 0), (1, 0, 0))
    for i in range(1, CIRPATTERN2_COUNT):
        add(cut_extrude3.rotate(cirpattern2_axis, i * 360 / CIRPATTERN2_COUNT), mode=Mode.SUBTRACT)


solid = part.part
